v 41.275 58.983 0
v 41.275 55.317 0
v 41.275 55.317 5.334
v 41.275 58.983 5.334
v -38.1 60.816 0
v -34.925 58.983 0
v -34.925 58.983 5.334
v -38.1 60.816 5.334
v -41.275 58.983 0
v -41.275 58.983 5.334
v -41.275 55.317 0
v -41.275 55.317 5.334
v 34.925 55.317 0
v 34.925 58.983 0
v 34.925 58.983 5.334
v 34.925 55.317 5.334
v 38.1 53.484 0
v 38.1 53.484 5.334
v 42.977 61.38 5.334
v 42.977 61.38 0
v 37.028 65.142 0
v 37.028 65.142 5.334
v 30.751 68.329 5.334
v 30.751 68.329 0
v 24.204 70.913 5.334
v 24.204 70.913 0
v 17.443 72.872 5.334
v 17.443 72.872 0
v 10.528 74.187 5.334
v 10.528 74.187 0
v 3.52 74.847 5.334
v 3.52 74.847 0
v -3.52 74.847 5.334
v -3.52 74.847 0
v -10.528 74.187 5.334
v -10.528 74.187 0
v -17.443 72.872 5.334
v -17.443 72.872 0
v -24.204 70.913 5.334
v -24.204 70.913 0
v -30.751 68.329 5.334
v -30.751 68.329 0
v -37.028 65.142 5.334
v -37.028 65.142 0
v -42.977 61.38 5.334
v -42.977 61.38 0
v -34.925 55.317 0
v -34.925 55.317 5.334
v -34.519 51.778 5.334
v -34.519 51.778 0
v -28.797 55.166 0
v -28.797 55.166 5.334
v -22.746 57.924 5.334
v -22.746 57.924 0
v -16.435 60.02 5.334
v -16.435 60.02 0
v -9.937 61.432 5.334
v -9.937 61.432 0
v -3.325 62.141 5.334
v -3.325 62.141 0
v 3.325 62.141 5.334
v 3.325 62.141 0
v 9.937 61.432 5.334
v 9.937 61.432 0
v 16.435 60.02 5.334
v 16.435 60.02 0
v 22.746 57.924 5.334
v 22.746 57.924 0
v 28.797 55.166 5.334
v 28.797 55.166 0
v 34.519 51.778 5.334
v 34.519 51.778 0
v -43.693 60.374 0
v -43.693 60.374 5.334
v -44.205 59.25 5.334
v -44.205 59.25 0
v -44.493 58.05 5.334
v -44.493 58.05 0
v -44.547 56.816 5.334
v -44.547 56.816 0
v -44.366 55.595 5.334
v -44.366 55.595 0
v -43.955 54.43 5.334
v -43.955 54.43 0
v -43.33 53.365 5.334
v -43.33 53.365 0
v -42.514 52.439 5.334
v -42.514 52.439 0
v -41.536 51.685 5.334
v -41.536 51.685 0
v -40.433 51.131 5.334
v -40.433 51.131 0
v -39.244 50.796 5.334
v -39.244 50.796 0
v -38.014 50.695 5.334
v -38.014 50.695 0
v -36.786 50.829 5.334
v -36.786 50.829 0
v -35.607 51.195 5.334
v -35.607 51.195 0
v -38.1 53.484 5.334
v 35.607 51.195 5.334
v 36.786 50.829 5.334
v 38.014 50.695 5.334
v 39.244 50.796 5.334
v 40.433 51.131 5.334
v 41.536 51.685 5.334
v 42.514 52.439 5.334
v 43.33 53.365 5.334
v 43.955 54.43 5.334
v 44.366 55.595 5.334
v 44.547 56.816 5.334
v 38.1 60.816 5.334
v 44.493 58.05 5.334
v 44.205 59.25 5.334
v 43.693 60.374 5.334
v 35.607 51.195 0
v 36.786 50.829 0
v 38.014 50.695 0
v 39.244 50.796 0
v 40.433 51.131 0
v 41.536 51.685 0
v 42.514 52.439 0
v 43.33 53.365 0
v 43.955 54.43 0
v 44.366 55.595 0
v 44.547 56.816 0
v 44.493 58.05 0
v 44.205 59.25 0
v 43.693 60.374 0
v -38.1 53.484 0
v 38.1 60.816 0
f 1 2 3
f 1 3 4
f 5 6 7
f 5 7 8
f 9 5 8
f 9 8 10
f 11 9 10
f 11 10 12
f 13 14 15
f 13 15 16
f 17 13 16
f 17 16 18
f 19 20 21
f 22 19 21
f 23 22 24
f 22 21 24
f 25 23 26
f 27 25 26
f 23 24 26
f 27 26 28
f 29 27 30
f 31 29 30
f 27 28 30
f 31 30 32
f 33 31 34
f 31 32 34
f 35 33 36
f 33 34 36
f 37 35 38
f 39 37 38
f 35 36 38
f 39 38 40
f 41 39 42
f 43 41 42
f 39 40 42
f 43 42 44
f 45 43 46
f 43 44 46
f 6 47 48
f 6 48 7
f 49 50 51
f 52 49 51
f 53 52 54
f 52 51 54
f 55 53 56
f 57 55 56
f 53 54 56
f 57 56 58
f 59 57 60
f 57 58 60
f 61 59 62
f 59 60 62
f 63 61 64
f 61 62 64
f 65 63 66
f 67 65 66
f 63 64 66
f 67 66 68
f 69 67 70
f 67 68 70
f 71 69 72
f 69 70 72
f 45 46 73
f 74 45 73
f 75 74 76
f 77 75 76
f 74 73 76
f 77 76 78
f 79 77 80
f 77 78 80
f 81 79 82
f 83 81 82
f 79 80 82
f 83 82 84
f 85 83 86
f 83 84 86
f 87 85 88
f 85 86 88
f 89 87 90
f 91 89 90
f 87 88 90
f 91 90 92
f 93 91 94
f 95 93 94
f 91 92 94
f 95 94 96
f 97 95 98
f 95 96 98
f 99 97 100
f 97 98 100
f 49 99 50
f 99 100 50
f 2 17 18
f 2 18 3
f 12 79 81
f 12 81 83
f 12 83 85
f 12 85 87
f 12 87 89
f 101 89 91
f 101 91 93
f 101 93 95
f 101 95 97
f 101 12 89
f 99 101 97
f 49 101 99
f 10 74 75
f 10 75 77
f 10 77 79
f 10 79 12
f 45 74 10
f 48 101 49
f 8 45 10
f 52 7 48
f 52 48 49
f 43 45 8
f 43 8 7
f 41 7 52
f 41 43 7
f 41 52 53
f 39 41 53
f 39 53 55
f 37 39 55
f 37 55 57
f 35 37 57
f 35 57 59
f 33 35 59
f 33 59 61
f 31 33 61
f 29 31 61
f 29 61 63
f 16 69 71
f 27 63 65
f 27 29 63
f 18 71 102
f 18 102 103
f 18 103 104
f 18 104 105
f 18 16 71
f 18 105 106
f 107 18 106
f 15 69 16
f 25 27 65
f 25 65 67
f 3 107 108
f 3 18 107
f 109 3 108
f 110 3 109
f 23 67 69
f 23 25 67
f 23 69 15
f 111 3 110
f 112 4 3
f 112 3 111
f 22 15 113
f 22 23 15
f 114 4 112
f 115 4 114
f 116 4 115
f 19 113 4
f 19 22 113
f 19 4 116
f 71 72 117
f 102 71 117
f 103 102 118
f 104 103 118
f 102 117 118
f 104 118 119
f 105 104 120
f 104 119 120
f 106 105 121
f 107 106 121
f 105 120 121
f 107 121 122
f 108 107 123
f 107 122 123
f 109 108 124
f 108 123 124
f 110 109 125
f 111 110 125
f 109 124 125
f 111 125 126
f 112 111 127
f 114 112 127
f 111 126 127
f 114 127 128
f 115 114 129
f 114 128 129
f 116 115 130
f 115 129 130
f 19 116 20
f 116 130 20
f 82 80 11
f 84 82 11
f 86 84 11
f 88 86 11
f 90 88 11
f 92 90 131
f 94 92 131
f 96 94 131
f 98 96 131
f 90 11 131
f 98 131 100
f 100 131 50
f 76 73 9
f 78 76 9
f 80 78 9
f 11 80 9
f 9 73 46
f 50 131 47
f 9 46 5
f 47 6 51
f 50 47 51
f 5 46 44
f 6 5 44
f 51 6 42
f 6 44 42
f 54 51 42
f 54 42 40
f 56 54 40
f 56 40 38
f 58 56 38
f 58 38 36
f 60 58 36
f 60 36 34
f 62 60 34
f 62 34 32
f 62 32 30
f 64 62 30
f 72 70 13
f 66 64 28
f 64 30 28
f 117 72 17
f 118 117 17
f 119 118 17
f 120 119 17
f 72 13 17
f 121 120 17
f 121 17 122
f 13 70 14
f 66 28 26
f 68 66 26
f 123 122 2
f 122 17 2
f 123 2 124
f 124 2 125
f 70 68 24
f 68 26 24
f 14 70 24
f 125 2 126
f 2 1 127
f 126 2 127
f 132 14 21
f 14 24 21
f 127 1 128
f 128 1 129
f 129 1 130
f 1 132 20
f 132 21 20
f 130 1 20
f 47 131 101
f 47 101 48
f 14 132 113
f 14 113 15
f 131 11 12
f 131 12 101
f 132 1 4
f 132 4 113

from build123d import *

# Parameters (mm, degrees)
BOSS_EXTRUDE1_DEPTH = 5.334


with BuildPart() as part:
    # Sketch1 → Boss-Extrude1 (new body)
    with BuildSketch(Plane.XY):
        with BuildLine():
            ThreePointArc((42.977057526, 61.379780274), (0, 74.93), (-42.977057526, 61.379780274))
            ThreePointArc((-42.977057526, 61.379780274), (-42.944185328, 52.882612065), (-34.518993211, 51.778489817))
            ThreePointArc((-34.518993211, 51.778489817), (0, 62.23), (34.518993211, 51.778489817))
            ThreePointArc((34.518993211, 51.778489817), (42.944185328, 52.882612065), (42.977057526, 61.379780274))
        make_face()
        Polygon((-38.1, 60.816174209), (-41.275, 58.983087105), (-41.275, 55.316912895), (-38.1, 53.483825791), (-34.925, 55.316912895), (-34.925, 58.983087105), align=None, mode=Mode.SUBTRACT)
        Polygon((38.1, 60.816174209), (34.925, 58.983087105), (34.925, 55.316912895), (38.1, 53.483825791), (41.275, 55.316912895), (41.275, 58.983087105), align=None, mode=Mode.SUBTRACT)
    extrude(amount=BOSS_EXTRUDE1_DEPTH)


solid = part.part
